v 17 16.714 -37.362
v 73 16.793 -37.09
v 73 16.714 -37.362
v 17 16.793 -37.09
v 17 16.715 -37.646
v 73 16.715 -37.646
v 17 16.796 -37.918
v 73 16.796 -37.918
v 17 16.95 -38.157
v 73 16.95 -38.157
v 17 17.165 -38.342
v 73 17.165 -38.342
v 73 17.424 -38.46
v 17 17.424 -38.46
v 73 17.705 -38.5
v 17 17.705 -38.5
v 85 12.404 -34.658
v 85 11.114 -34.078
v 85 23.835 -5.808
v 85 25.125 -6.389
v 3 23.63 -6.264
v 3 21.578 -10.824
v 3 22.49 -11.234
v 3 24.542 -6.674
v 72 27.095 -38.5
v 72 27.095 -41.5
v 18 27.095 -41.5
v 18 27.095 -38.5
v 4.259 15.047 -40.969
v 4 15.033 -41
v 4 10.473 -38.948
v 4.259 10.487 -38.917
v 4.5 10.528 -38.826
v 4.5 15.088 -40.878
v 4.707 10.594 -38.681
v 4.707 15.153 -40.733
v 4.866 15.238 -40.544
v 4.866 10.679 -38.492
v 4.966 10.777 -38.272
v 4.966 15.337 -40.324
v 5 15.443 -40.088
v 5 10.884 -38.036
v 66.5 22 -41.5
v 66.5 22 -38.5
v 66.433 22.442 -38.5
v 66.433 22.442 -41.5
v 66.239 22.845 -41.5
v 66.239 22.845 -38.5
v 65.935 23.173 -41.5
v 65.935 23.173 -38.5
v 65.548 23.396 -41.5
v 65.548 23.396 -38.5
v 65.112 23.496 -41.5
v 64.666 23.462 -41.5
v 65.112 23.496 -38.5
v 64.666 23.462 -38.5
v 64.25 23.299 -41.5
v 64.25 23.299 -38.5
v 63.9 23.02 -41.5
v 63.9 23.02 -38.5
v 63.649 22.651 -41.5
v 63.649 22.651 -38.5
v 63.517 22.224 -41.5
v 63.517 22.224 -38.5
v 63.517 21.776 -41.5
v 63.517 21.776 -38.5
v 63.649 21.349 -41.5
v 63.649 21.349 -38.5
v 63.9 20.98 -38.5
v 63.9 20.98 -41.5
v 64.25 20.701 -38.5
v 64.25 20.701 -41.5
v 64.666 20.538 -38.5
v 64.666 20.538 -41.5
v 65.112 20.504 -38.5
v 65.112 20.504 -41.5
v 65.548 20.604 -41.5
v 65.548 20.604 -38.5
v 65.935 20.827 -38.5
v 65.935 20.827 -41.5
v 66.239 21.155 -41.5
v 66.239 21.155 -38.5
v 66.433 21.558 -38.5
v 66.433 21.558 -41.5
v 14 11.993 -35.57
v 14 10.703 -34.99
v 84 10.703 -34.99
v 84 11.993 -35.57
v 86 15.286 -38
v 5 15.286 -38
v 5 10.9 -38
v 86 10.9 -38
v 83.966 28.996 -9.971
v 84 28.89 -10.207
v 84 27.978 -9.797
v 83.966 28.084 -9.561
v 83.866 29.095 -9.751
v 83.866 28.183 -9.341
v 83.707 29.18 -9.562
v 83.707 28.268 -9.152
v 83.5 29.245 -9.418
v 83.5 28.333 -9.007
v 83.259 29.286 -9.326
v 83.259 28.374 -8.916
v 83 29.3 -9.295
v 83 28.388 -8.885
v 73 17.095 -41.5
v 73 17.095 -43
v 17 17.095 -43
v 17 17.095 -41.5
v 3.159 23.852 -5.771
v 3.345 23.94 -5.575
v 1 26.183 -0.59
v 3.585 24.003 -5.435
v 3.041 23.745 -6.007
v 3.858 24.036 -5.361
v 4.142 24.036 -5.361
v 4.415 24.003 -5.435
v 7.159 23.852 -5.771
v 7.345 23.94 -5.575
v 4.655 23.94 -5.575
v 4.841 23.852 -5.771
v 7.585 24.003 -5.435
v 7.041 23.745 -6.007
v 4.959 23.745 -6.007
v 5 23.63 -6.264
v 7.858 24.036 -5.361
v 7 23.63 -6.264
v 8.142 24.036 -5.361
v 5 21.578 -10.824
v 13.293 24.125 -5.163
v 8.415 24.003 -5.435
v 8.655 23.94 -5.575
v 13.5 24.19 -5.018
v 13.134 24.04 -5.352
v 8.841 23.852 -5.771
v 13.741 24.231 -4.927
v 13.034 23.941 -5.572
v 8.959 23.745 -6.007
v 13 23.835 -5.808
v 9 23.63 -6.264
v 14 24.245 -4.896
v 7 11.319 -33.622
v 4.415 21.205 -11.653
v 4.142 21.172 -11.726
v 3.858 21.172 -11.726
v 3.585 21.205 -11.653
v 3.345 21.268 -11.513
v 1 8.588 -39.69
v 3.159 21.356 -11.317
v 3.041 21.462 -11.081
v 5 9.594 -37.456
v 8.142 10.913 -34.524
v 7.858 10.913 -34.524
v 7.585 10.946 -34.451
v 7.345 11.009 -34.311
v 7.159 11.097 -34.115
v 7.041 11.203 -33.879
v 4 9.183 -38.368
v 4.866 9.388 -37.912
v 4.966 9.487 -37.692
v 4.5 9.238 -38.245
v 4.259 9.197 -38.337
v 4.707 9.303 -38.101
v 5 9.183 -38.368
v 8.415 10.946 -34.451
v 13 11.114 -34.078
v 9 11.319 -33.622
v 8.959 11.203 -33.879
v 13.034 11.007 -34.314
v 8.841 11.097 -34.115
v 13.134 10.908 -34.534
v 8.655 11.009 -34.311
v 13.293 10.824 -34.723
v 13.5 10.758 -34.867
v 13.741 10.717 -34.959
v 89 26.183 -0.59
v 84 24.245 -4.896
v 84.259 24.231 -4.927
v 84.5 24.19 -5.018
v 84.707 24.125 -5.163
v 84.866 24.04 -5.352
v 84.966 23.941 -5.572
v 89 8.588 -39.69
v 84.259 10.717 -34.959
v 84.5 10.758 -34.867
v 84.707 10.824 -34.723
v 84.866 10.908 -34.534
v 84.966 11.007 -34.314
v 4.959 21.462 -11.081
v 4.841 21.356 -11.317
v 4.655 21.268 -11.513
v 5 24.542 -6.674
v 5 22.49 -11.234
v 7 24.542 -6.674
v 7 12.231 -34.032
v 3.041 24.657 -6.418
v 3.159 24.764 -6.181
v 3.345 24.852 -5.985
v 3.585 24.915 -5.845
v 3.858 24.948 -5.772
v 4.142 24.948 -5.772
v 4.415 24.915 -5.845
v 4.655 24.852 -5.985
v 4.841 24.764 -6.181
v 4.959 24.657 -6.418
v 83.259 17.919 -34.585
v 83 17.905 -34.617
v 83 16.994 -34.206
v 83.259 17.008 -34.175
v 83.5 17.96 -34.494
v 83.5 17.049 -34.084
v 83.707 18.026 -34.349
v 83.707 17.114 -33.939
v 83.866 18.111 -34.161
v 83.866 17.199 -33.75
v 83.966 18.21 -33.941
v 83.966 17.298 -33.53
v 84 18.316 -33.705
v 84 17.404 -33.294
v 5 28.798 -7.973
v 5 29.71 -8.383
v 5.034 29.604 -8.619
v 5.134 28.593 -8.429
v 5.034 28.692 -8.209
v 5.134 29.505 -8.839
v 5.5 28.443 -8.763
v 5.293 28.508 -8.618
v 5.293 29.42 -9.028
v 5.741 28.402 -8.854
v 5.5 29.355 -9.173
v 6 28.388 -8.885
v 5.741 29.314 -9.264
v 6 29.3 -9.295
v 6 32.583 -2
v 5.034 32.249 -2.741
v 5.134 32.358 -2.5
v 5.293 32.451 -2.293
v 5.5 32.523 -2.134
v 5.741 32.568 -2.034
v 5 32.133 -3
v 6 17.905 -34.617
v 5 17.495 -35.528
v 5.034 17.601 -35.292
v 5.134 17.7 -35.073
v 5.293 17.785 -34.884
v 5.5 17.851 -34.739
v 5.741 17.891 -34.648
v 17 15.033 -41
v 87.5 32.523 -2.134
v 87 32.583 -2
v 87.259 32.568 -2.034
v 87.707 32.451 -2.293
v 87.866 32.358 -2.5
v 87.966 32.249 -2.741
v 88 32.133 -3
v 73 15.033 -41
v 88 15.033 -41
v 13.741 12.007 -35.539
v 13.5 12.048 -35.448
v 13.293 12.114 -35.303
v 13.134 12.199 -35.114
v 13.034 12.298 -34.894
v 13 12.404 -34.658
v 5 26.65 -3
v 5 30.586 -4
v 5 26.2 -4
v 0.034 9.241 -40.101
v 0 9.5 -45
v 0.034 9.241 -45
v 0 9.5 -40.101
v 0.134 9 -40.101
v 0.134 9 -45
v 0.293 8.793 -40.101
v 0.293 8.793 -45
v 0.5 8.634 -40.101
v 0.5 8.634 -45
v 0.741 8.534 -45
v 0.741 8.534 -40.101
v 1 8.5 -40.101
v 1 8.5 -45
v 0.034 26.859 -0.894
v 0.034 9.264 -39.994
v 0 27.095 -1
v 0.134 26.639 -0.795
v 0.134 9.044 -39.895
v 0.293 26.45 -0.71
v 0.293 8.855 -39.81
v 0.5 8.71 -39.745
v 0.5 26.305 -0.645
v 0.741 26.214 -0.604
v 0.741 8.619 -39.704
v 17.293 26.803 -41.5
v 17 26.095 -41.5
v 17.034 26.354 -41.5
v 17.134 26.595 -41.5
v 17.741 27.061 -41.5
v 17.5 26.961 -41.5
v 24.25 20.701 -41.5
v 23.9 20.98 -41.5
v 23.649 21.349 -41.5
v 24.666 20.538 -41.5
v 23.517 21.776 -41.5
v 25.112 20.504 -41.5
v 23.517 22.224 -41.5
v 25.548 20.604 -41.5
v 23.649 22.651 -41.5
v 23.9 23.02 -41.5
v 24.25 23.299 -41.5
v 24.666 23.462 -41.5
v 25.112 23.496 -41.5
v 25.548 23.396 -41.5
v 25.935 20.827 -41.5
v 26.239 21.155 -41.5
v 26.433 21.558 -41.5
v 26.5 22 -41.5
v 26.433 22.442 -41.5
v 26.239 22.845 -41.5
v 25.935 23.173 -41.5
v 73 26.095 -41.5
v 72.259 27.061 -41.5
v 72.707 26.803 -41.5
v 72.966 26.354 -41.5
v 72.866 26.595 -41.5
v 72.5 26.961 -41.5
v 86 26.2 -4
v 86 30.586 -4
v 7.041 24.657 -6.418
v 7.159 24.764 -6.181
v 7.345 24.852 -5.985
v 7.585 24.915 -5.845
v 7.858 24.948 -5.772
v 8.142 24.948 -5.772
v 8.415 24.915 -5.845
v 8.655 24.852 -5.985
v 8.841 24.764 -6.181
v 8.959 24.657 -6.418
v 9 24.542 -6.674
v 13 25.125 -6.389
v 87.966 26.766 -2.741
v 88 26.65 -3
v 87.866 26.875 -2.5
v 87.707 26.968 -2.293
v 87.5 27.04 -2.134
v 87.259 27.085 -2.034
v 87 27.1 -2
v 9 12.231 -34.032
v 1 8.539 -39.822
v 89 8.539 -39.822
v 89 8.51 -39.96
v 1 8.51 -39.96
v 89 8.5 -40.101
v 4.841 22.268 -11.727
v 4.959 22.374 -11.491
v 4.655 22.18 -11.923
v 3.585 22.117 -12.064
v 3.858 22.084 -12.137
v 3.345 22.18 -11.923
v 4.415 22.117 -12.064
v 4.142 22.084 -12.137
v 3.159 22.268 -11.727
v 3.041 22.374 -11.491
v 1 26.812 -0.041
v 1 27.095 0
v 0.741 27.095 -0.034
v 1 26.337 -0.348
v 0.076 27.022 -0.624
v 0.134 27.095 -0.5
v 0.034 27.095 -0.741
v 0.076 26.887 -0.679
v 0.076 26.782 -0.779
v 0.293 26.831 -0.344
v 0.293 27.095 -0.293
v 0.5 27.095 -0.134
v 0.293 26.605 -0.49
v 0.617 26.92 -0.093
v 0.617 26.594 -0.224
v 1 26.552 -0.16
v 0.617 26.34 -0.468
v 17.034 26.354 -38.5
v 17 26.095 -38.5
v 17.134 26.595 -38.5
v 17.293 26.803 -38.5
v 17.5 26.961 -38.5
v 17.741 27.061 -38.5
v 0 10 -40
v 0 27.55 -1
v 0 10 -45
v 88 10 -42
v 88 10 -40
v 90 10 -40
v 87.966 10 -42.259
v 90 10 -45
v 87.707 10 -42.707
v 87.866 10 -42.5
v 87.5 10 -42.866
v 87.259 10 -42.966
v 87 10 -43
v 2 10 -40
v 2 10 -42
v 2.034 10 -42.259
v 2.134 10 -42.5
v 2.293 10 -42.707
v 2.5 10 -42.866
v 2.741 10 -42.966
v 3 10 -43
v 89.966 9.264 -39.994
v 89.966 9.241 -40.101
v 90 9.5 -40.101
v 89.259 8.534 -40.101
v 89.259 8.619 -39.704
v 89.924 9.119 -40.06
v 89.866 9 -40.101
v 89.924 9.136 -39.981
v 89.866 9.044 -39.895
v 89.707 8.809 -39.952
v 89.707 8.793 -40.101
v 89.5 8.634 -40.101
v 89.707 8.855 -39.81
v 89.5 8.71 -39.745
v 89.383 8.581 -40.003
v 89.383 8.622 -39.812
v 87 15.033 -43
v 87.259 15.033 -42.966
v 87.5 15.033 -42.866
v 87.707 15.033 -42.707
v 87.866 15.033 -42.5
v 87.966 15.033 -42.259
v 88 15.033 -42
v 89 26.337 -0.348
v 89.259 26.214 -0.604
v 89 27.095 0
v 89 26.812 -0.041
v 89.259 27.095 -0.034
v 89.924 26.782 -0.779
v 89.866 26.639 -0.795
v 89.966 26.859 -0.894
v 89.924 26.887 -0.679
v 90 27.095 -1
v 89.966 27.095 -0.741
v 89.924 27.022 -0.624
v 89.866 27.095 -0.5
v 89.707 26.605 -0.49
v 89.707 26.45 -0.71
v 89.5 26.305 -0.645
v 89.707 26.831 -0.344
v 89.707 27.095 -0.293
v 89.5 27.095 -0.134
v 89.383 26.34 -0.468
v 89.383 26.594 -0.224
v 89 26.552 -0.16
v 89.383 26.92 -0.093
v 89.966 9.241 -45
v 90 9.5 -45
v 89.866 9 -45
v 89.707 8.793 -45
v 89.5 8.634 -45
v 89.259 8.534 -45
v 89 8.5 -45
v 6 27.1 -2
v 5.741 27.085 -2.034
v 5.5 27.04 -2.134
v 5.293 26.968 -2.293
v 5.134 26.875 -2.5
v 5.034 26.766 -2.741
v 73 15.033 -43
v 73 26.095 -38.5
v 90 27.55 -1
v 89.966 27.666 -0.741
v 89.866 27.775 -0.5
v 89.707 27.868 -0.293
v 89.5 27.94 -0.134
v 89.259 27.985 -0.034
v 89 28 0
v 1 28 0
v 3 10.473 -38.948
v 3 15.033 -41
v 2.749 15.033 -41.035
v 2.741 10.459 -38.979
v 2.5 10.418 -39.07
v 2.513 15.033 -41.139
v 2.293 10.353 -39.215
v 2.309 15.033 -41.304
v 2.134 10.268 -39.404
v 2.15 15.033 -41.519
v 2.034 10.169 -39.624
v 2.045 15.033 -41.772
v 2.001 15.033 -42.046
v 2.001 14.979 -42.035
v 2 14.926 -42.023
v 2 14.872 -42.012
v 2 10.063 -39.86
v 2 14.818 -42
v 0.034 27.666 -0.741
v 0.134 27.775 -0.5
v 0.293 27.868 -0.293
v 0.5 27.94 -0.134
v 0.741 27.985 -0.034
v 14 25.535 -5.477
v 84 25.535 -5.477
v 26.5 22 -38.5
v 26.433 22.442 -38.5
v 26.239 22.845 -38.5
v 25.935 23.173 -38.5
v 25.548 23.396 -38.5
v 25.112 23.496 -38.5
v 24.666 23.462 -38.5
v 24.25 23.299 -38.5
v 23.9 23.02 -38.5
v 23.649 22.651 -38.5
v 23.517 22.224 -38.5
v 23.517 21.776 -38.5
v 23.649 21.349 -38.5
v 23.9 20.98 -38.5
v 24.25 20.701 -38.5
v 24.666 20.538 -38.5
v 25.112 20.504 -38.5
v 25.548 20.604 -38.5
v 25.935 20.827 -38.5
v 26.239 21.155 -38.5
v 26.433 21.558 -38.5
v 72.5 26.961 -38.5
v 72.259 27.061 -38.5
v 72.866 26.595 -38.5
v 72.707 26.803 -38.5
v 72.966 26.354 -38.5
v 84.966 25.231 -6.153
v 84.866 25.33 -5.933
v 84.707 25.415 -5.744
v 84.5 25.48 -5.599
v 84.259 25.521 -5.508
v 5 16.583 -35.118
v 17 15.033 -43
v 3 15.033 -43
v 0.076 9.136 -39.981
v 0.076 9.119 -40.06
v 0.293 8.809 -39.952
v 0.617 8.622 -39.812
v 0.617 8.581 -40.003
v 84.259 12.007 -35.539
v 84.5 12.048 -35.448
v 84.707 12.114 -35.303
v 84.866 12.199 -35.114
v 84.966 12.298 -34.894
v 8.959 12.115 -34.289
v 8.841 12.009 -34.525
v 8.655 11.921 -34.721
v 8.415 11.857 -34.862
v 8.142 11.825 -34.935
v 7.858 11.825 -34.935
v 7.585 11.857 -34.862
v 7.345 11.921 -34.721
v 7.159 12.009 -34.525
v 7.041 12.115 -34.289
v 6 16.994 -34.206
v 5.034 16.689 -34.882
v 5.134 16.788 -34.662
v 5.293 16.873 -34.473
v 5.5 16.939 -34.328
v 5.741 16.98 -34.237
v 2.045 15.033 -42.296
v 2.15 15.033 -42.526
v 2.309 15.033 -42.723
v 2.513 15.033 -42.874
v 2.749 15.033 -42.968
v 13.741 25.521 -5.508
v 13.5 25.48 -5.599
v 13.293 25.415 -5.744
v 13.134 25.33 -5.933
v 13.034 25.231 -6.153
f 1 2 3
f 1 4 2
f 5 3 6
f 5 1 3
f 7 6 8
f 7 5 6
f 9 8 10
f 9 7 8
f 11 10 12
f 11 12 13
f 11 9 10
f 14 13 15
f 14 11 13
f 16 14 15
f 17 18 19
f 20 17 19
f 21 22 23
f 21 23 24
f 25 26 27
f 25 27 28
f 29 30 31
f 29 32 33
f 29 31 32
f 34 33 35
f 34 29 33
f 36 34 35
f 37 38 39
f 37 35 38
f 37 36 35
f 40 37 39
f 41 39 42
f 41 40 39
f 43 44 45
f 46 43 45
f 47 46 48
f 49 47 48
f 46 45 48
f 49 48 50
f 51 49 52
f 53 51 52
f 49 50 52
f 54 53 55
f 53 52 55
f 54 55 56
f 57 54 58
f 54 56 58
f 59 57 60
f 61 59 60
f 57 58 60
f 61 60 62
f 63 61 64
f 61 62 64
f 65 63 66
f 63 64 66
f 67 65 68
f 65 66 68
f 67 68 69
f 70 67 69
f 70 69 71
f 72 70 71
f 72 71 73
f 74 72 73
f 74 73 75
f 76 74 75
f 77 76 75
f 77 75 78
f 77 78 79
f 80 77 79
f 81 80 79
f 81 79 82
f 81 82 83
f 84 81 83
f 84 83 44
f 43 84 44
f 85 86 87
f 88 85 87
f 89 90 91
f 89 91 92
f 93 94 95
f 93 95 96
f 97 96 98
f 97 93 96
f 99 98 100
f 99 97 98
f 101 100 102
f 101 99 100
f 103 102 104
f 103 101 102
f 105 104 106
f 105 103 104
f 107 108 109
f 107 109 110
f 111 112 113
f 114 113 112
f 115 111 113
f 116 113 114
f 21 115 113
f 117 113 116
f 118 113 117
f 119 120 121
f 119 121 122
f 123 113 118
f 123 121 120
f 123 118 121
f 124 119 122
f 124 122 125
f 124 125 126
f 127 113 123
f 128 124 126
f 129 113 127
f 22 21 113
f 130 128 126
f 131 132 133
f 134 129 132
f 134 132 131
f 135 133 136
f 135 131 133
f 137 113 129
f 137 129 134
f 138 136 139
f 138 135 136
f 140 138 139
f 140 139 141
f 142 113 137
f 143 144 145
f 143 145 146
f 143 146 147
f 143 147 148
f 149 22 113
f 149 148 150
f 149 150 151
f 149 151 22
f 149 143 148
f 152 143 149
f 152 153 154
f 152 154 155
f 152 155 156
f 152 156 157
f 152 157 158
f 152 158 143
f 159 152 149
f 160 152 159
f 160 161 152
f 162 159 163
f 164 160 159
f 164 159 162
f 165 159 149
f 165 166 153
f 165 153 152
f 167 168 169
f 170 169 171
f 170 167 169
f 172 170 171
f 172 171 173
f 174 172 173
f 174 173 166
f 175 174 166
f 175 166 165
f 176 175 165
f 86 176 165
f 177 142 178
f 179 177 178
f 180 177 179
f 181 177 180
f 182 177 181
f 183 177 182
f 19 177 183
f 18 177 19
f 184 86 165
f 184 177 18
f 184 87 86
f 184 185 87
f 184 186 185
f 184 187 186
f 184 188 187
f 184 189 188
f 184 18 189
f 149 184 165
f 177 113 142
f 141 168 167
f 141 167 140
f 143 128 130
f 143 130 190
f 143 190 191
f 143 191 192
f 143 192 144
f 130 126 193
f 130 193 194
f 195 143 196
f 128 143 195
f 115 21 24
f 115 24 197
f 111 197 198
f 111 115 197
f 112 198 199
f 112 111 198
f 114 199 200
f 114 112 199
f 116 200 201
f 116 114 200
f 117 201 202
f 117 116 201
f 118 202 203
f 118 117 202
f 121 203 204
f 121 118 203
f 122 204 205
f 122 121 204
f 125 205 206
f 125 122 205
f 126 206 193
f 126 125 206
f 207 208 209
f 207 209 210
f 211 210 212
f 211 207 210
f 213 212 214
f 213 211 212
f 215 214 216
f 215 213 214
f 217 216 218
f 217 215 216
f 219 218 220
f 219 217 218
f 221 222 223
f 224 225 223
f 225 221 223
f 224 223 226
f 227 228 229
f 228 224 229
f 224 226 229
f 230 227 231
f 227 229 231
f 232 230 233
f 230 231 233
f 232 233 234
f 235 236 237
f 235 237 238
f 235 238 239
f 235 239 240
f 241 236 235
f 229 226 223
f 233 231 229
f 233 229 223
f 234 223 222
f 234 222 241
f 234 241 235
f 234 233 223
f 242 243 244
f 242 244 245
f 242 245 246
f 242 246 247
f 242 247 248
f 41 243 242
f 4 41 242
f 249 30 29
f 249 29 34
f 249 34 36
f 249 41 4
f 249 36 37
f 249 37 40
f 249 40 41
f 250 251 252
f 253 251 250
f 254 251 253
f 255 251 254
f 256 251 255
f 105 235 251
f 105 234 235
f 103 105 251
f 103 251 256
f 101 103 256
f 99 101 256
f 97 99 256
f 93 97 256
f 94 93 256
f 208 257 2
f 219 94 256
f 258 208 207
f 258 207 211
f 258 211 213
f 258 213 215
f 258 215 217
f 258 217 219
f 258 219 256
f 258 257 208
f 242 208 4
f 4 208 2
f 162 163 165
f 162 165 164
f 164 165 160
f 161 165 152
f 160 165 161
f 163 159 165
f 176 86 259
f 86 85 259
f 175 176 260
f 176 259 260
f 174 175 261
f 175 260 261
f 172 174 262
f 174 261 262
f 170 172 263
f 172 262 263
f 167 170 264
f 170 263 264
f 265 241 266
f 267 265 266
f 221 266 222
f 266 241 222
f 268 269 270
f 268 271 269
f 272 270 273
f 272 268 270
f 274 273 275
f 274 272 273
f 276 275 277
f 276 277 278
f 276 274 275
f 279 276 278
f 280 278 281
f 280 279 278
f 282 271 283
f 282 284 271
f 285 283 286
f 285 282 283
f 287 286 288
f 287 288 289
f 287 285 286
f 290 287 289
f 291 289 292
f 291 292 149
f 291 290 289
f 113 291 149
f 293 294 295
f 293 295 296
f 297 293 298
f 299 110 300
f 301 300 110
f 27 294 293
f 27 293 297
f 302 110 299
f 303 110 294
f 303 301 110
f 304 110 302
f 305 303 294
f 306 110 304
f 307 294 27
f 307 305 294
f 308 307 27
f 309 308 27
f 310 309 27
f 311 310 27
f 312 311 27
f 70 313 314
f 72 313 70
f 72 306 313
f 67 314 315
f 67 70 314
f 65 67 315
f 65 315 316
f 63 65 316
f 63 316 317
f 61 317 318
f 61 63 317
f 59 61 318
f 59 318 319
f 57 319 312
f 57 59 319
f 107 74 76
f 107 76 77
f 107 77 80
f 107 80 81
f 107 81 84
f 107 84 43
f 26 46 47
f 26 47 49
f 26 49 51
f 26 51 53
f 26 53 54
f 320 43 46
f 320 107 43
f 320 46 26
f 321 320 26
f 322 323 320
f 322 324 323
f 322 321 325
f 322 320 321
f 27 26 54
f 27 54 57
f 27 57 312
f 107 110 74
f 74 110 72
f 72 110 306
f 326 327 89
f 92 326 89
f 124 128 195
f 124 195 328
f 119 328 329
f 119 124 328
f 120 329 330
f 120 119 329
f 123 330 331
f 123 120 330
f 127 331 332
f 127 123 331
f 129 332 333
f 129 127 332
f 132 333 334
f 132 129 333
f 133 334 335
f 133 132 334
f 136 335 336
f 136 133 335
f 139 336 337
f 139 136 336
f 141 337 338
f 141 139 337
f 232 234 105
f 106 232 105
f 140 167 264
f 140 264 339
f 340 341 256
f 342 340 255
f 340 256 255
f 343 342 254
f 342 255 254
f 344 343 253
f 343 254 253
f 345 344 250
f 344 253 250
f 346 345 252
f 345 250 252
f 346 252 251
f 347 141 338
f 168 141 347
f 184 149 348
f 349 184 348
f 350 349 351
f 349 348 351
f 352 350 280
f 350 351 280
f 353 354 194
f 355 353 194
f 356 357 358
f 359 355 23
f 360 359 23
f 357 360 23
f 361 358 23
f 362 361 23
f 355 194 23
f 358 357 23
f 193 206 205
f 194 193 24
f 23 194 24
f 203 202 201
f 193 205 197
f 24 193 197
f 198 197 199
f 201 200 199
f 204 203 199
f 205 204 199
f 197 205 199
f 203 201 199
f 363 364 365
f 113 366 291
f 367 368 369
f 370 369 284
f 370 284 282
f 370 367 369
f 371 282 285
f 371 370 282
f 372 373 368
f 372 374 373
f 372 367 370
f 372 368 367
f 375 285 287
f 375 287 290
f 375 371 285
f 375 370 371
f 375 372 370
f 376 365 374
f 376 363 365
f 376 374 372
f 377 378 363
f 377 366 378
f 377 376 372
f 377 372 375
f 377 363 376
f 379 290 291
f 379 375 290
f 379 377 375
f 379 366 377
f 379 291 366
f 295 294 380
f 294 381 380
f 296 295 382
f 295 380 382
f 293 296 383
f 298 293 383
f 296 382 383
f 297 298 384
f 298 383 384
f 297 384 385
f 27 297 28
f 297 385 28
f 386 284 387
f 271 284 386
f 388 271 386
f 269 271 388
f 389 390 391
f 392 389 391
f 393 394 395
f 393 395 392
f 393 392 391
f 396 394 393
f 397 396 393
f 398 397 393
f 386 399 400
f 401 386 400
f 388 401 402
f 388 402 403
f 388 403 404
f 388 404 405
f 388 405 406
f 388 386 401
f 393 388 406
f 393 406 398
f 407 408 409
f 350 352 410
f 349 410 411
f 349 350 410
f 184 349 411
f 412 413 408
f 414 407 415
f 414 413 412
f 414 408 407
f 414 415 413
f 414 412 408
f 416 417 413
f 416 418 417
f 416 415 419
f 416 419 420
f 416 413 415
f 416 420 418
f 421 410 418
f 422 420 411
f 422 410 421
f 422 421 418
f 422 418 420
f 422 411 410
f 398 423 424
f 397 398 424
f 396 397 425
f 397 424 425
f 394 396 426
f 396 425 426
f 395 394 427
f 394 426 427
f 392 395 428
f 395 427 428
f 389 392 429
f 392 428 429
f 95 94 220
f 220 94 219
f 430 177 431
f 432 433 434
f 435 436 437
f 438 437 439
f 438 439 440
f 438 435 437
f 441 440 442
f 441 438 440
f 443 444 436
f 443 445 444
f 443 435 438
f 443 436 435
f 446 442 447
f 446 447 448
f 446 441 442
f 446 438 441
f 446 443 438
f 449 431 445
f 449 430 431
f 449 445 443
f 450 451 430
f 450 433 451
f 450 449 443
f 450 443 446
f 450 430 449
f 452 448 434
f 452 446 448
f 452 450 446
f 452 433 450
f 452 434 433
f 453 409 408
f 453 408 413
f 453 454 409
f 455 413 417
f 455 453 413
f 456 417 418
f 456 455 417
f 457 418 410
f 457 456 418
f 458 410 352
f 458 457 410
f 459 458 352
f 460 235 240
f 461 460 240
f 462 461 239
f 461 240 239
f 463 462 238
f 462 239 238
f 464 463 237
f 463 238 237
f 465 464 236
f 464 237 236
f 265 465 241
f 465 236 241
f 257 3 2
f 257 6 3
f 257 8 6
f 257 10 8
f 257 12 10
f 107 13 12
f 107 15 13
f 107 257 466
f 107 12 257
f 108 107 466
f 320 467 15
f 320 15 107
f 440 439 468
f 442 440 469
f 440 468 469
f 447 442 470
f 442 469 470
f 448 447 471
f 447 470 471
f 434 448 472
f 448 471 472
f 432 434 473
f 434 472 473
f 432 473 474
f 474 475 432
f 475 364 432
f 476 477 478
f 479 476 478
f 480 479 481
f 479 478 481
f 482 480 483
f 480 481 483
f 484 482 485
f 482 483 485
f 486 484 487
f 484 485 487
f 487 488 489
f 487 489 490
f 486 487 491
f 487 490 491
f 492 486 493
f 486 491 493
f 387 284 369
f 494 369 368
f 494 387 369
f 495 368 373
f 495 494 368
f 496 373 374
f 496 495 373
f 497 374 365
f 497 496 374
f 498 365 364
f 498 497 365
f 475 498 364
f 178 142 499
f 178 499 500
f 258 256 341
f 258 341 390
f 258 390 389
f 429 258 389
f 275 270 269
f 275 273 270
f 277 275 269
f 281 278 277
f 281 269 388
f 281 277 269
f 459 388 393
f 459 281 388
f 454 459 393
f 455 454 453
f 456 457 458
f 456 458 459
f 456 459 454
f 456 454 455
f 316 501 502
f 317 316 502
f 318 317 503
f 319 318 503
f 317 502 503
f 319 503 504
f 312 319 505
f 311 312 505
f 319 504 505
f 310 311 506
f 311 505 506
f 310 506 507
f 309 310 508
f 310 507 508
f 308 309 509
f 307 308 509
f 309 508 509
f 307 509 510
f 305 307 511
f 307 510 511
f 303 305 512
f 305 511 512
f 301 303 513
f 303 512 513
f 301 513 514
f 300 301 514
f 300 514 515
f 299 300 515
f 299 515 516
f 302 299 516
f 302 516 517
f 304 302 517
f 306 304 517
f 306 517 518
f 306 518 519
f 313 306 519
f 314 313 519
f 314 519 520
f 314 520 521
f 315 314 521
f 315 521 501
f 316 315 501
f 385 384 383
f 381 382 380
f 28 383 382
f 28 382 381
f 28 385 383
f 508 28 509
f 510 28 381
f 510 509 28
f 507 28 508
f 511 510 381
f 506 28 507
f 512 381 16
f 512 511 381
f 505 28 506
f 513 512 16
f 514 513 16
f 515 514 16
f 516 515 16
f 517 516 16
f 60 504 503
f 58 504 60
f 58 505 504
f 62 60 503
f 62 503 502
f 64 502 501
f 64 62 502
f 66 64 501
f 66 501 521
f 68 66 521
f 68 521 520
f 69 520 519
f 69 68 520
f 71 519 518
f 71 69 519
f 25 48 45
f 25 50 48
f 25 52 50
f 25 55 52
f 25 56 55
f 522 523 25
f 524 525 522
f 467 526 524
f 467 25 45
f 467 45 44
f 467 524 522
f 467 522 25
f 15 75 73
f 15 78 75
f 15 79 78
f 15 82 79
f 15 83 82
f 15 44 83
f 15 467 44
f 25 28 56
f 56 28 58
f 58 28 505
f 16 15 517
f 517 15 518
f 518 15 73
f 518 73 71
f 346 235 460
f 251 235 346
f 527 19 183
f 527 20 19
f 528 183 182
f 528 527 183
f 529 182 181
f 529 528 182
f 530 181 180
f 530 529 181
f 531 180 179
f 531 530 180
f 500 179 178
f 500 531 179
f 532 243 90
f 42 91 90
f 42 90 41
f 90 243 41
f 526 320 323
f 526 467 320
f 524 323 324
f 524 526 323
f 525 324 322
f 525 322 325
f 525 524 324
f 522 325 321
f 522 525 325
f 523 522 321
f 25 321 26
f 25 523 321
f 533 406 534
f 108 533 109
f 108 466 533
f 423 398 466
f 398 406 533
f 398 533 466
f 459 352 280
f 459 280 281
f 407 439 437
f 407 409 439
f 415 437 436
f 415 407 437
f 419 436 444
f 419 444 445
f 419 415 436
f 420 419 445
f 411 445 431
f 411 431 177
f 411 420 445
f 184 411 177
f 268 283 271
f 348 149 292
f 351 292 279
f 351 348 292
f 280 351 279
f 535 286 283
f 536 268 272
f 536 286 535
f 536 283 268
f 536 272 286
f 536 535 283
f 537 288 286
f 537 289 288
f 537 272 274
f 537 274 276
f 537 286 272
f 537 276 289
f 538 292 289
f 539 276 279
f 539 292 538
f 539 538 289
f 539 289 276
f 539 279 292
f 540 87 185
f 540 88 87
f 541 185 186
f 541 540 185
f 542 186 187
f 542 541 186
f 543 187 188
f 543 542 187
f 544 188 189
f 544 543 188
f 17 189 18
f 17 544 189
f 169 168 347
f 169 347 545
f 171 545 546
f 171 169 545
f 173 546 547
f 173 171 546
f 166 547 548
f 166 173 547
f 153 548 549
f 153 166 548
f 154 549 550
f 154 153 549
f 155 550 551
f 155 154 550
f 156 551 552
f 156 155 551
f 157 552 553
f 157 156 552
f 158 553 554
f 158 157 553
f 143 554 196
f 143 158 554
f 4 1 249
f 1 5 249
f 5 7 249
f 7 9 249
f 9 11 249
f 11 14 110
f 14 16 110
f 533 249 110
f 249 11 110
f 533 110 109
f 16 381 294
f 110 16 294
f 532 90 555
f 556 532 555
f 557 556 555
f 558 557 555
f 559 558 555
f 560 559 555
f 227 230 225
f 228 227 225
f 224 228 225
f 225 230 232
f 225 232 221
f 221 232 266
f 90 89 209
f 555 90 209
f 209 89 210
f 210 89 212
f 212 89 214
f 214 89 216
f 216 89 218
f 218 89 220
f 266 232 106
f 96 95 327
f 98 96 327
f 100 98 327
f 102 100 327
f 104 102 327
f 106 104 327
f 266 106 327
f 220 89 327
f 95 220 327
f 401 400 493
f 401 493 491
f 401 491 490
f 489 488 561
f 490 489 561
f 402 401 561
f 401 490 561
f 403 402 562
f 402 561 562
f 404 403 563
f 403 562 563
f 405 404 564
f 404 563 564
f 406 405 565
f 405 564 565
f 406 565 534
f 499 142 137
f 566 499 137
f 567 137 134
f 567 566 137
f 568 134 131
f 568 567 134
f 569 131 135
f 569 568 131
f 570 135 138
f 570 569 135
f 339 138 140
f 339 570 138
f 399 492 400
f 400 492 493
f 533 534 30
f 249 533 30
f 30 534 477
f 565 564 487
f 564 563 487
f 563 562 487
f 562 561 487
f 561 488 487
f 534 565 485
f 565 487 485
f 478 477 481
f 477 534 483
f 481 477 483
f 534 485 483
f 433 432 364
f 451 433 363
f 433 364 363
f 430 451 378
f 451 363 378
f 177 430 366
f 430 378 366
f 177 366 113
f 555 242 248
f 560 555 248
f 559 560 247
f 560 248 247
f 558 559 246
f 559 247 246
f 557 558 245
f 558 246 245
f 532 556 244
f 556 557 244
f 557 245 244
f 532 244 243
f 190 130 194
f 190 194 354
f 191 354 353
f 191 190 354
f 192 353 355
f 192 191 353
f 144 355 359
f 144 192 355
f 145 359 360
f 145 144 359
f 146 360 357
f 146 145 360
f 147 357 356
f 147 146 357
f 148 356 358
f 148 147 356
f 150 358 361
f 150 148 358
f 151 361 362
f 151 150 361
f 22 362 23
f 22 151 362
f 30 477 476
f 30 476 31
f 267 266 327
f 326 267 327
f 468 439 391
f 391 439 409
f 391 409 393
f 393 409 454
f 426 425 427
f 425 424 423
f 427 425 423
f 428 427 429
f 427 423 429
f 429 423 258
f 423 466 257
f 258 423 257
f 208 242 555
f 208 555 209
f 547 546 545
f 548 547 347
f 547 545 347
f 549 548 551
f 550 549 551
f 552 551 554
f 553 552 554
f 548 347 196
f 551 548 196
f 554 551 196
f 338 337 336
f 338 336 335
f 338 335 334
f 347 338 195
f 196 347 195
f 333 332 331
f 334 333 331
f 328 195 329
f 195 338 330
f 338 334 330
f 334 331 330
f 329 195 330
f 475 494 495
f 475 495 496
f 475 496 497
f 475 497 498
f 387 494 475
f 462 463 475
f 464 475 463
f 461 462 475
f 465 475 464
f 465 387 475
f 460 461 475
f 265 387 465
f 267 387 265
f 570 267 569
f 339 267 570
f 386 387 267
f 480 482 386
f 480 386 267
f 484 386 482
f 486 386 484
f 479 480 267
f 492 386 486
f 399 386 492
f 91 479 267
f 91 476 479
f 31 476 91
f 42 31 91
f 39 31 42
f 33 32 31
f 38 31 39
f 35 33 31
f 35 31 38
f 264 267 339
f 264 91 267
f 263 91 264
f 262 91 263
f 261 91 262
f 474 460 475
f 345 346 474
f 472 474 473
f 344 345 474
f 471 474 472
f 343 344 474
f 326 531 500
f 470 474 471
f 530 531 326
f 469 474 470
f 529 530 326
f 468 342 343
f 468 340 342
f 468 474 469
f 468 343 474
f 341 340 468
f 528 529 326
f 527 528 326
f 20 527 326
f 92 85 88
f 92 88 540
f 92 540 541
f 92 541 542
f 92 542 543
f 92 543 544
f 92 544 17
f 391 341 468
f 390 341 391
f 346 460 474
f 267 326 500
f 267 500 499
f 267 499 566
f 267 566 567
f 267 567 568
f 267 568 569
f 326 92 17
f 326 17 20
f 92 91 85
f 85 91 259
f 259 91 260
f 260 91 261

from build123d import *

# Parameters (mm, degrees)
SKETCH_1_W               = 90
SKETCH_1_H               = 45
EXTRUDE_1_DEPTH          = 60
CUT_EXTRUDE_1_DEPTH      = 118.153745139
CUT_EXTRUDE_1_DEPTH_BACK = 118.153745139
CUT_EXTRUDE_2_DEPTH      = 105.446158378
EXTRUDE_3_REACH          = 105.804
SKETCH_4_W               = 86
SKETCH_4_H               = 41
SKETCH_4_W_2             = 82
SKETCH_4_H_2             = 34
CUT_EXTRUDE_3_DEPTH      = 105.522724802
SKETCH_6_W               = 72
SKETCH_6_H               = 33
CUT_EXTRUDE_4_DEPTH      = 98.541192544
EXTRUDE_8_DEPTH          = 82
CUT_EXTRUDE_5_REACH      = 99.614
SKETCH_10_W              = 79
SKETCH_10_H              = 27.766838789
SKETCH_11_W              = 3
SKETCH_11_H              = 42.766838789
CUT_EXTRUDE_6_DEPTH      = 5
EXTRUDE_9_DEPTH          = 28
SKETCH_13_R              = 1.5
CUT_EXTRUDE_7_DEPTH      = 104.169264805
FILLET_1_R               = 1
FILLET_2_R               = 1
FILLET_3_R               = 1
CUT_EXTRUDE_8_DEPTH      = 1


with BuildPart() as part:
    # 草图1 → 凸台-拉伸1 (new body)
    with BuildSketch(Plane(origin=(0, 0, 0), x_dir=(1, 0, 0), z_dir=(0, 1, 0))):
        with Locations((45, 22.5)):
            Rectangle(SKETCH_1_W, SKETCH_1_H)
    extrude(amount=EXTRUDE_1_DEPTH)

    # 草图2 → 切除-拉伸1 (cut, two sides: drawn at the far end of the back side and taken through both)
    with BuildSketch(Plane(origin=(90, 0, 0), x_dir=(0, 0, -1), z_dir=(1, 0, 0)).offset(-CUT_EXTRUDE_1_DEPTH_BACK)):
        Polygon((0, 220), (0, 60), (0, 28), (40, 10), (45, 10), (205, 10), (433.983745882, 233.531751932), (228.983745882, 443.531751932), align=None)
    extrude(amount=CUT_EXTRUDE_1_DEPTH + CUT_EXTRUDE_1_DEPTH_BACK, mode=Mode.SUBTRACT)

    # 草图3 → 切除-拉伸2 (cut, through all)
    with BuildSketch(Plane(origin=(90, 0, 0), x_dir=(0, 0, -1), z_dir=(1, 0, 0))):
        Polygon((0, 26.44865757), (39.885905712, 8.5), (45, 8.5), (45, 0), (0, 0), align=None)
    extrude(amount=-CUT_EXTRUDE_2_DEPTH, mode=Mode.SUBTRACT)

    # 草图4 → 凸台-拉伸3 (add, up to next)
    with BuildSketch(Plane(origin=(0, 34, 0), x_dir=(1, 0, 0), z_dir=(0, 1, 0)), mode=Mode.PRIVATE) as extrude_3_sk1:
        with Locations((45, 22.5)):
            Rectangle(SKETCH_4_W, SKETCH_4_H)
        with Locations((45, 21)):
            Rectangle(SKETCH_4_W_2, SKETCH_4_H_2, mode=Mode.SUBTRACT)
    extrude_3_tool1 = extrude(extrude_3_sk1.sketch, amount=-EXTRUDE_3_REACH, mode=Mode.PRIVATE) - part.part
    add(extrude_3_tool1.solids().sort_by_distance((45, 34, -2.952733))[0])

    # 草图5 → 切除-拉伸3 (cut, through all)
    with BuildSketch(Plane.ZY.offset(-2)):
        Polygon((-43, 15.03292805), (-41, 15.03292805), (-2, 32.58292805), (-2, 34), (-43, 34), align=None)
    extrude(amount=-CUT_EXTRUDE_3_DEPTH, mode=Mode.SUBTRACT)

    # 草图6 → 切除-拉伸4 (cut, through all)
    with BuildSketch(Plane(origin=(0, 21.99472563, -9.897626534), x_dir=(1, 0, 0), z_dir=(0, -0.9119215051751064, 0.41036467732879806))):
        with Locations((49, -11.015560293)):
            Rectangle(SKETCH_6_W, SKETCH_6_H)
    extrude(amount=-CUT_EXTRUDE_4_DEPTH, mode=Mode.SUBTRACT)

    # 草图9 → 凸台-拉伸8 (add)
    with BuildSketch(Plane(origin=(4, 0, 0), x_dir=(0, 0, -1), z_dir=(1, 0, 0))):
        Polygon((4, 31.68292805), (4, 30.58634244), (38, 15.28634244), (38, 16.38292805), align=None)
    extrude(amount=EXTRUDE_8_DEPTH)

    # 草图10 → 切除-拉伸5 (cut, up to next)
    with BuildSketch(Plane(origin=(0, 27.844430811, -12.529993865), x_dir=(1, 0, 0), z_dir=(0, 0.9119215051751064, -0.410364677328798)), mode=Mode.PRIVATE) as cut_extrude_5_sk1:
        with Locations((44.5, 10.33637965)):
            Rectangle(SKETCH_10_W, SKETCH_10_H)
    cut_extrude_5_tool1 = extrude(cut_extrude_5_sk1.sketch, amount=-CUT_EXTRUDE_5_REACH, mode=Mode.PRIVATE) & part.part
    add(cut_extrude_5_tool1.solids().sort_by_distance((44.5, 23.602746, -21.955961))[0], mode=Mode.SUBTRACT)

    # 草图11 → 切除-拉伸6 (cut)
    with BuildSketch(Plane(origin=(0, 27.844430811, -12.529993865), x_dir=(1, 0, 0), z_dir=(0, 0.9119215051751064, -0.410364677328798))):
        with Locations((3.5, 9.836379649)):
            Rectangle(SKETCH_11_W, SKETCH_11_H)
    extrude(amount=-CUT_EXTRUDE_6_DEPTH, mode=Mode.SUBTRACT)

    # 草图12 → 凸台-拉伸9 (add, symmetric)
    with BuildSketch(Plane(origin=(45, 0, 0), x_dir=(0, 0, -1), z_dir=(1, 0, 0))):
        Polygon((43, 15.03292805), (43, 17.095415955), (41.5, 17.095415955), (41.5, 27.095415955), (38.5, 27.095415955), (38.5, 15.06134244), (41, 15.03292805), align=None)
    extrude(amount=EXTRUDE_9_DEPTH, both=True)

    # 草图13 → 切除-拉伸7 (cut, through all)
    with BuildSketch(Plane.XY.offset(-38.5)):
        with Locations((25, 22)):
            Circle(SKETCH_13_R)
        with Locations((65, 22)):
            Circle(SKETCH_13_R)
    extrude(amount=-CUT_EXTRUDE_7_DEPTH, mode=Mode.SUBTRACT)

    # 圆角1
    fillet_1_edges = [part.edges().sort_by_distance(p)[0] for p in [
        (13, 11.348360437, -35.279929664),
        (13, 24.890394788, -5.186519993),
        (85, 24.890394788, -5.186519993),
        (85, 11.348360437, -35.279929664),
        (90, 27.224328785, 0),
        (0, 27.224328785, 0),
        (0, 17.474328785, -19.942952856),
        (45, 26.44865757, 0),
        (0, 8.5, -42.442952856),
        (45, 8.5, -39.885905712),
        (90, 8.5, -42.442952856),
        (90, 17.474328785, -19.942952856),
    ]]
    fillet(fillet_1_edges, radius=FILLET_1_R)

    # 圆角2
    fillet_2_edges = [part.edges().sort_by_distance(p)[0] for p in [
        (45, 16.15792805, -38.5),
        (73, 27.095415955, -40),
        (17, 27.095415955, -40),
    ]]
    fillet(fillet_2_edges, radius=FILLET_2_R)

    # 圆角3
    # the kernel refuses this fillet: 1 mm, written as the material it adds along each edge
    with BuildSketch(Plane(origin=(84, 29.300010631, -9.295372041), x_dir=(0, -0.4103646773287979, -0.9119215051751064), z_dir=(0, -0.9119215051751064, 0.41036467732879794)), Plane(origin=(84, 17.905480791, -34.616549464), x_dir=(-1, 0, 0), z_dir=(0, -0.9119215051751064, 0.41036467732879794))) as fillet_3_piece_1:
        with BuildLine():
            CenterArc((FILLET_3_R, -FILLET_3_R), FILLET_3_R, 90, 90)
            Line((0, -FILLET_3_R), (0, 0))
            Line((0, 0), (FILLET_3_R, 0))
        make_face()
    extrude(amount=1)
    with BuildSketch(Plane(origin=(5, 15.03292805, -41), x_dir=(-1, 0, 0), z_dir=(0, -0.9119215051751064, 0.410364677328798))) as fillet_3_piece_2_section:
        with BuildLine():
            CenterArc((FILLET_3_R, -FILLET_3_R), FILLET_3_R, 90, 90)
            Line((0, -FILLET_3_R), (0, 0))
            Line((0, 0), (FILLET_3_R, 0))
        make_face()
    fillet_3_piece_2 = extrude(amount=7.5, mode=Mode.PRIVATE)
    fillet_3_piece_2 = split(fillet_3_piece_2, bisect_by=Plane(origin=(4.869229562, 9.339477608, -38.020399916), z_dir=(0, 0.9119215051751064, -0.41036467732879794)), keep=Keep.TOP, mode=Mode.PRIVATE)
    add(fillet_3_piece_2)
    # the kernel refuses this fillet: 1 mm, written as the material it takes off along each edge
    with BuildSketch(Plane(origin=(88, 17.53292805, -43), x_dir=(-1, 0, 0), z_dir=(0, -1, 0))) as fillet_3_2_piece_1:
        with BuildLine():
            CenterArc((FILLET_3_R, -FILLET_3_R), FILLET_3_R, 90, 90)
            Line((0, -FILLET_3_R), (0, 0))
            Line((0, 0), (FILLET_3_R, 0))
        make_face()
    extrude(amount=7.53292805, mode=Mode.SUBTRACT)
    with BuildSketch(Plane(origin=(2, 17.53292805, -43), x_dir=(1, 0, 0), z_dir=(0, -1, 0))) as fillet_3_2_piece_2:
        with BuildLine():
            CenterArc((FILLET_3_R, FILLET_3_R), FILLET_3_R, 180, 90)
            Line((0, FILLET_3_R), (0, 0))
            Line((0, 0), (FILLET_3_R, 0))
        make_face()
    extrude(amount=7.53292805, mode=Mode.SUBTRACT)
    with BuildSketch(Plane(origin=(5, 31.579814394, -10.321283735), x_dir=(1, 0, 0), z_dir=(0, -0.9119215051751064, 0.41036467732879794)), Plane(origin=(5, 20.185284554, -35.642461157), x_dir=(0, -0.4103646773287979, -0.9119215051751064), z_dir=(0, -0.9119215051751064, 0.41036467732879794))) as fillet_3_2_piece_3:
        with BuildLine():
            CenterArc((FILLET_3_R, FILLET_3_R), FILLET_3_R, 180, 90)
            Line((0, FILLET_3_R), (0, 0))
            Line((0, 0), (FILLET_3_R, 0))
        make_face()
    extrude(amount=6, mode=Mode.SUBTRACT)
    with BuildSketch(Plane(origin=(2, 17.312731813, -42.025911693), x_dir=(0, -0.410364677328798, -0.9119215051751063), z_dir=(0, -0.9119215051751064, 0.410364677328798))) as fillet_3_2_piece_4:
        with BuildLine():
            CenterArc((FILLET_3_R, FILLET_3_R), FILLET_3_R, 180, 90)
            Line((0, FILLET_3_R), (0, 0))
            Line((0, 0), (FILLET_3_R, 0))
        make_face()
    extrude(amount=7.5, mode=Mode.SUBTRACT)
    with BuildSketch(Plane(origin=(5, 35.08292805, -2), x_dir=(0, 0, -1), z_dir=(0, -1, 0))) as fillet_3_2_piece_5_section:
        with BuildLine():
            CenterArc((FILLET_3_R, FILLET_3_R), FILLET_3_R, 180, 90)
            Line((0, FILLET_3_R), (0, 0))
            Line((0, 0), (FILLET_3_R, 0))
        make_face()
    fillet_3_2_piece_5 = extrude(amount=10.48292805, mode=Mode.PRIVATE)
    fillet_3_2_piece_5 = split(fillet_3_2_piece_5, bisect_by=Plane(origin=(5.223367939, 27.46114469, -1.197456246), z_dir=(0, 0.9119215051751064, -0.4103646773287979)), keep=Keep.TOP, mode=Mode.PRIVATE)
    add(fillet_3_2_piece_5, mode=Mode.SUBTRACT)
    with BuildSketch(Plane(origin=(88, 35.08292805, -2), x_dir=(-1, 0, 0), z_dir=(0, -1, 0))) as fillet_3_2_piece_6_section:
        with BuildLine():
            CenterArc((FILLET_3_R, FILLET_3_R), FILLET_3_R, 180, 90)
            Line((0, FILLET_3_R), (0, 0))
            Line((0, 0), (FILLET_3_R, 0))
        make_face()
    fillet_3_2_piece_6 = extrude(amount=10.48292805, mode=Mode.PRIVATE)
    fillet_3_2_piece_6 = split(fillet_3_2_piece_6, bisect_by=Plane(origin=(87.776632061, 27.46114469, -1.197456246), z_dir=(0, 0.9119215051751064, -0.4103646773287979)), keep=Keep.TOP, mode=Mode.PRIVATE)
    add(fillet_3_2_piece_6, mode=Mode.SUBTRACT)

    # 草图14 → 切除-拉伸8 (cut)
    with BuildSketch(Plane(origin=(0, 21.99472563, -9.897626534), x_dir=(1, 0, 0), z_dir=(0, -0.9119215051751063, 0.4103646773287981))):
        with BuildLine():
            Line((9, 3.984439707), (9, -26.015560293))
            ThreePointArc((9, -26.015560293), (8, -27.015560293), (7, -26.015560293))
            Line((7, -26.015560293), (7, 3.984439707))
            ThreePointArc((7, 3.984439707), (8, 4.984439707), (9, 3.984439707))
        make_face()
        with BuildLine():
            Line((3, -1.015560293), (3, 3.984439707))
            ThreePointArc((3, 3.984439707), (4, 4.984439707), (5, 3.984439707))
            Line((5, 3.984439707), (5, -1.015560293))
            ThreePointArc((5, -1.015560293), (4, -2.015560293), (3, -1.015560293))
        make_face()
    extrude(amount=-CUT_EXTRUDE_8_DEPTH, mode=Mode.SUBTRACT)


solid = part.part
